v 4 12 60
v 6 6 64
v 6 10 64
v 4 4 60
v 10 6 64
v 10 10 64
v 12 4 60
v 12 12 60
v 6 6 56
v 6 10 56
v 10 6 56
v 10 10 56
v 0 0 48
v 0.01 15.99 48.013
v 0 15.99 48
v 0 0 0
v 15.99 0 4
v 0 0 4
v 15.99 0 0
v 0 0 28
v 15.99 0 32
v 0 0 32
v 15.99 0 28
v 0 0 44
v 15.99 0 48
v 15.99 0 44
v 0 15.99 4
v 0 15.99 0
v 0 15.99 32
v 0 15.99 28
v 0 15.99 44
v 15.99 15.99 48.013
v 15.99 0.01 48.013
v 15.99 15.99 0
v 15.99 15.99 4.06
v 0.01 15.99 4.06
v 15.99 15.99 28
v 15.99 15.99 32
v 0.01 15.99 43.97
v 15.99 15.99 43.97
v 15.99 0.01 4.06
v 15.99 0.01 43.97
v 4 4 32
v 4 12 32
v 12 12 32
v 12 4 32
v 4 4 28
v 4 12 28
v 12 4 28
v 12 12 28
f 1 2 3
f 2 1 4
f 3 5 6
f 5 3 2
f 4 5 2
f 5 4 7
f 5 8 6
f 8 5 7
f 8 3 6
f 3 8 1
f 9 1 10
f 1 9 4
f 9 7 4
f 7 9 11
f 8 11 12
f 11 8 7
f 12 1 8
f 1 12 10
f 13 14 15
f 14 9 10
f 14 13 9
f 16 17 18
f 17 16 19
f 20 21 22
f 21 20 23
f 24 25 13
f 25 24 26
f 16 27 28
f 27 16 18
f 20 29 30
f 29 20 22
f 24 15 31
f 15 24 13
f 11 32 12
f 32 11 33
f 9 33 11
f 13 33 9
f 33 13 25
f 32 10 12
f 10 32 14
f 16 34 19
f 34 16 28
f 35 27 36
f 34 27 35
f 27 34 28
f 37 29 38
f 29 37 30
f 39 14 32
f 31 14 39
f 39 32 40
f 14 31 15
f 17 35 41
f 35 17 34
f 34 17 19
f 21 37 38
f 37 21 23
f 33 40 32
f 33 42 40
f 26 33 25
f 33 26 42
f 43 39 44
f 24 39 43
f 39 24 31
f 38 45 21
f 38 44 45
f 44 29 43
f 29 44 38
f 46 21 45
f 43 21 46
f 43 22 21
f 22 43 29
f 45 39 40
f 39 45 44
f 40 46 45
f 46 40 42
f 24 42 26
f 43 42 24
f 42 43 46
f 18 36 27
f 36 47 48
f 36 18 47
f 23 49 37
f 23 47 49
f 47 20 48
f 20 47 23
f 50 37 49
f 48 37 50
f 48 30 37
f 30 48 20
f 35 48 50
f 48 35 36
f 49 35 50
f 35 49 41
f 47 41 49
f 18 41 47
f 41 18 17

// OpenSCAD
//Creating the top Jewel


difference() {
translate([4,4,60])
cube([8,8,4]);

union () {
translate([4,12,60])
rotate([90,0,0])
linear_extrude(height = 8, center = false,convexity = 10, twist = 0) {
polygon (points=[[0,0],[2,4],[0,4]], paths = [[0,1,2]]);
}
translate([4,4,60])
rotate([90,0,90])
linear_extrude(height = 8, center = false,convexity = 10, twist = 0) {
polygon (points=[[0,0],[2,4],[0,4]], paths = [[0,1,2]]);
}
translate([12,4,60])
rotate([90,0,180])
linear_extrude(height = 8, center = false,convexity = 10, twist = 0) {
polygon (points=[[0,0],[2,4],[0,4]], paths = [[0,1,2]]);
}
translate([12,12,60])
rotate([90,0,-90])
linear_extrude(height = 8, center = false,convexity = 10, twist = 0) {
polygon (points=[[0,0],[2,4],[0,4]], paths = [[0,1,2]]);
}
}
}

//Bottom Jewel

difference() {
translate([4,4,56])
cube([8,8,4]);

union () {
translate([4,4,60])
rotate([-90,0,0])
linear_extrude(height = 8, center = false,convexity = 10, twist = 0) {
polygon (points=[[0,4],[0,0],[2,4]], paths = [[0,1,2]]);
}
translate([12,4,60])
rotate([-90,0,90])
linear_extrude(height = 8, center = false,convexity = 10, twist = 0) {
polygon (points=[[0,4],[0,0],[2,4]], paths = [[0,1,2]]);
}
translate([12,12,60])
rotate([-90,0,180])
linear_extrude(height = 8, center = false,convexity = 10, twist = 0) {
polygon (points=[[0,4],[0,0],[2,4]], paths = [[0,1,2]]);
}
translate([4,12,60])
rotate([-90,0,270])
linear_extrude(height = 8, center = false,convexity = 10, twist = 0) {
polygon (points=[[0,4],[0,0],[2,4]], paths = [[0,1,2]]);
}
}
}



//Beginning of Body of Stand
difference() {
cube([16,16,56]);


union () {

translate([0,16,48])
rotate([90,0,0])
linear_extrude(height = 16, center = false,convexity = 10, twist = 0) {
polygon (points=[[0,0],[6,8],[0,8]], paths = [[0,1,2]]);
}

translate([16,0,48])
rotate([90,0,180])
linear_extrude(height = 16, center = false,convexity = 10, twist = 0) {
polygon (points=[[0,0],[6,8],[0,8]], paths = [[0,1,2]]);
}

translate([0,0,48])
rotate([90,0,90])
linear_extrude(height = 16, center = false,convexity = 10, twist = 0) {
polygon (points=[[0,0],[6,8],[0,8]], paths = [[0,1,2]]);
}

translate([16,16,48])
rotate([90,0,-90])
linear_extrude(height = 16, center = false,convexity = 10, twist = 0) {
polygon (points=[[0,0],[6,8],[0,8]], paths = [[0,1,2]]);
}

//fix for certain edges
translate([0,15.99,0])
cube([16,.01,64]);
translate([15.99,0,0])
cube([.01,16,64]);

//Creating B1 - Starts at h=32
translate([0,16,32]) {
rotate([90,0,0])
linear_extrude(height = 16, center = false, convexity = 10, twist = 0) {
polygon(points=[[0,0],[4,0],[0,12]], paths=[[0,1,2]]);
}}
translate([16,16,32]) {
rotate([90,0,-90])
linear_extrude(height = 16, center = false, convexity = 10, twist = 0) {
polygon(points=[[0,0],[4,0],[0,12]], paths=[[0,1,2]]);
}}
translate([16,0,32]) {
rotate([90,0,-180])
linear_extrude(height = 16, center = false, convexity = 10, twist = 0) {
polygon(points=[[0,0],[4,0],[0,12]], paths=[[0,1,2]]);
}}
translate([0,0,32]) {
rotate([90,0,90])
linear_extrude(height = 16, center = false, convexity = 10, twist = 0) {
polygon(points=[[0,0],[4,0],[0,12]], paths=[[0,1,2]]);
}}

//Creating B2
translate([0,16,4]) {
rotate([90,0,0])
linear_extrude(height = 16, center = false, convexity = 10, twist = 0) {
polygon(points=[[0,0],[4,24],[0,24]], paths=[[0,1,2]]);
}}
translate([16,16,4]) {
rotate([90,0,-90])
linear_extrude(height = 16, center = false, convexity = 10, twist = 0) {
polygon(points=[[0,0],[4,24],[0,24]], paths=[[0,1,2]]);
}}
translate([16,0,4]) {
rotate([90,0,-180])
linear_extrude(height = 16, center = false, convexity = 10, twist = 0) {
polygon(points=[[0,0],[4,24],[0,24]], paths=[[0,1,2]]);
}}
translate([0,0,4]) {
rotate([90,0,90])
linear_extrude(height = 16, center = false, convexity = 10, twist = 0) {
polygon(points=[[0,0],[4,24],[0,24]], paths=[[0,1,2]]);
}}}}
